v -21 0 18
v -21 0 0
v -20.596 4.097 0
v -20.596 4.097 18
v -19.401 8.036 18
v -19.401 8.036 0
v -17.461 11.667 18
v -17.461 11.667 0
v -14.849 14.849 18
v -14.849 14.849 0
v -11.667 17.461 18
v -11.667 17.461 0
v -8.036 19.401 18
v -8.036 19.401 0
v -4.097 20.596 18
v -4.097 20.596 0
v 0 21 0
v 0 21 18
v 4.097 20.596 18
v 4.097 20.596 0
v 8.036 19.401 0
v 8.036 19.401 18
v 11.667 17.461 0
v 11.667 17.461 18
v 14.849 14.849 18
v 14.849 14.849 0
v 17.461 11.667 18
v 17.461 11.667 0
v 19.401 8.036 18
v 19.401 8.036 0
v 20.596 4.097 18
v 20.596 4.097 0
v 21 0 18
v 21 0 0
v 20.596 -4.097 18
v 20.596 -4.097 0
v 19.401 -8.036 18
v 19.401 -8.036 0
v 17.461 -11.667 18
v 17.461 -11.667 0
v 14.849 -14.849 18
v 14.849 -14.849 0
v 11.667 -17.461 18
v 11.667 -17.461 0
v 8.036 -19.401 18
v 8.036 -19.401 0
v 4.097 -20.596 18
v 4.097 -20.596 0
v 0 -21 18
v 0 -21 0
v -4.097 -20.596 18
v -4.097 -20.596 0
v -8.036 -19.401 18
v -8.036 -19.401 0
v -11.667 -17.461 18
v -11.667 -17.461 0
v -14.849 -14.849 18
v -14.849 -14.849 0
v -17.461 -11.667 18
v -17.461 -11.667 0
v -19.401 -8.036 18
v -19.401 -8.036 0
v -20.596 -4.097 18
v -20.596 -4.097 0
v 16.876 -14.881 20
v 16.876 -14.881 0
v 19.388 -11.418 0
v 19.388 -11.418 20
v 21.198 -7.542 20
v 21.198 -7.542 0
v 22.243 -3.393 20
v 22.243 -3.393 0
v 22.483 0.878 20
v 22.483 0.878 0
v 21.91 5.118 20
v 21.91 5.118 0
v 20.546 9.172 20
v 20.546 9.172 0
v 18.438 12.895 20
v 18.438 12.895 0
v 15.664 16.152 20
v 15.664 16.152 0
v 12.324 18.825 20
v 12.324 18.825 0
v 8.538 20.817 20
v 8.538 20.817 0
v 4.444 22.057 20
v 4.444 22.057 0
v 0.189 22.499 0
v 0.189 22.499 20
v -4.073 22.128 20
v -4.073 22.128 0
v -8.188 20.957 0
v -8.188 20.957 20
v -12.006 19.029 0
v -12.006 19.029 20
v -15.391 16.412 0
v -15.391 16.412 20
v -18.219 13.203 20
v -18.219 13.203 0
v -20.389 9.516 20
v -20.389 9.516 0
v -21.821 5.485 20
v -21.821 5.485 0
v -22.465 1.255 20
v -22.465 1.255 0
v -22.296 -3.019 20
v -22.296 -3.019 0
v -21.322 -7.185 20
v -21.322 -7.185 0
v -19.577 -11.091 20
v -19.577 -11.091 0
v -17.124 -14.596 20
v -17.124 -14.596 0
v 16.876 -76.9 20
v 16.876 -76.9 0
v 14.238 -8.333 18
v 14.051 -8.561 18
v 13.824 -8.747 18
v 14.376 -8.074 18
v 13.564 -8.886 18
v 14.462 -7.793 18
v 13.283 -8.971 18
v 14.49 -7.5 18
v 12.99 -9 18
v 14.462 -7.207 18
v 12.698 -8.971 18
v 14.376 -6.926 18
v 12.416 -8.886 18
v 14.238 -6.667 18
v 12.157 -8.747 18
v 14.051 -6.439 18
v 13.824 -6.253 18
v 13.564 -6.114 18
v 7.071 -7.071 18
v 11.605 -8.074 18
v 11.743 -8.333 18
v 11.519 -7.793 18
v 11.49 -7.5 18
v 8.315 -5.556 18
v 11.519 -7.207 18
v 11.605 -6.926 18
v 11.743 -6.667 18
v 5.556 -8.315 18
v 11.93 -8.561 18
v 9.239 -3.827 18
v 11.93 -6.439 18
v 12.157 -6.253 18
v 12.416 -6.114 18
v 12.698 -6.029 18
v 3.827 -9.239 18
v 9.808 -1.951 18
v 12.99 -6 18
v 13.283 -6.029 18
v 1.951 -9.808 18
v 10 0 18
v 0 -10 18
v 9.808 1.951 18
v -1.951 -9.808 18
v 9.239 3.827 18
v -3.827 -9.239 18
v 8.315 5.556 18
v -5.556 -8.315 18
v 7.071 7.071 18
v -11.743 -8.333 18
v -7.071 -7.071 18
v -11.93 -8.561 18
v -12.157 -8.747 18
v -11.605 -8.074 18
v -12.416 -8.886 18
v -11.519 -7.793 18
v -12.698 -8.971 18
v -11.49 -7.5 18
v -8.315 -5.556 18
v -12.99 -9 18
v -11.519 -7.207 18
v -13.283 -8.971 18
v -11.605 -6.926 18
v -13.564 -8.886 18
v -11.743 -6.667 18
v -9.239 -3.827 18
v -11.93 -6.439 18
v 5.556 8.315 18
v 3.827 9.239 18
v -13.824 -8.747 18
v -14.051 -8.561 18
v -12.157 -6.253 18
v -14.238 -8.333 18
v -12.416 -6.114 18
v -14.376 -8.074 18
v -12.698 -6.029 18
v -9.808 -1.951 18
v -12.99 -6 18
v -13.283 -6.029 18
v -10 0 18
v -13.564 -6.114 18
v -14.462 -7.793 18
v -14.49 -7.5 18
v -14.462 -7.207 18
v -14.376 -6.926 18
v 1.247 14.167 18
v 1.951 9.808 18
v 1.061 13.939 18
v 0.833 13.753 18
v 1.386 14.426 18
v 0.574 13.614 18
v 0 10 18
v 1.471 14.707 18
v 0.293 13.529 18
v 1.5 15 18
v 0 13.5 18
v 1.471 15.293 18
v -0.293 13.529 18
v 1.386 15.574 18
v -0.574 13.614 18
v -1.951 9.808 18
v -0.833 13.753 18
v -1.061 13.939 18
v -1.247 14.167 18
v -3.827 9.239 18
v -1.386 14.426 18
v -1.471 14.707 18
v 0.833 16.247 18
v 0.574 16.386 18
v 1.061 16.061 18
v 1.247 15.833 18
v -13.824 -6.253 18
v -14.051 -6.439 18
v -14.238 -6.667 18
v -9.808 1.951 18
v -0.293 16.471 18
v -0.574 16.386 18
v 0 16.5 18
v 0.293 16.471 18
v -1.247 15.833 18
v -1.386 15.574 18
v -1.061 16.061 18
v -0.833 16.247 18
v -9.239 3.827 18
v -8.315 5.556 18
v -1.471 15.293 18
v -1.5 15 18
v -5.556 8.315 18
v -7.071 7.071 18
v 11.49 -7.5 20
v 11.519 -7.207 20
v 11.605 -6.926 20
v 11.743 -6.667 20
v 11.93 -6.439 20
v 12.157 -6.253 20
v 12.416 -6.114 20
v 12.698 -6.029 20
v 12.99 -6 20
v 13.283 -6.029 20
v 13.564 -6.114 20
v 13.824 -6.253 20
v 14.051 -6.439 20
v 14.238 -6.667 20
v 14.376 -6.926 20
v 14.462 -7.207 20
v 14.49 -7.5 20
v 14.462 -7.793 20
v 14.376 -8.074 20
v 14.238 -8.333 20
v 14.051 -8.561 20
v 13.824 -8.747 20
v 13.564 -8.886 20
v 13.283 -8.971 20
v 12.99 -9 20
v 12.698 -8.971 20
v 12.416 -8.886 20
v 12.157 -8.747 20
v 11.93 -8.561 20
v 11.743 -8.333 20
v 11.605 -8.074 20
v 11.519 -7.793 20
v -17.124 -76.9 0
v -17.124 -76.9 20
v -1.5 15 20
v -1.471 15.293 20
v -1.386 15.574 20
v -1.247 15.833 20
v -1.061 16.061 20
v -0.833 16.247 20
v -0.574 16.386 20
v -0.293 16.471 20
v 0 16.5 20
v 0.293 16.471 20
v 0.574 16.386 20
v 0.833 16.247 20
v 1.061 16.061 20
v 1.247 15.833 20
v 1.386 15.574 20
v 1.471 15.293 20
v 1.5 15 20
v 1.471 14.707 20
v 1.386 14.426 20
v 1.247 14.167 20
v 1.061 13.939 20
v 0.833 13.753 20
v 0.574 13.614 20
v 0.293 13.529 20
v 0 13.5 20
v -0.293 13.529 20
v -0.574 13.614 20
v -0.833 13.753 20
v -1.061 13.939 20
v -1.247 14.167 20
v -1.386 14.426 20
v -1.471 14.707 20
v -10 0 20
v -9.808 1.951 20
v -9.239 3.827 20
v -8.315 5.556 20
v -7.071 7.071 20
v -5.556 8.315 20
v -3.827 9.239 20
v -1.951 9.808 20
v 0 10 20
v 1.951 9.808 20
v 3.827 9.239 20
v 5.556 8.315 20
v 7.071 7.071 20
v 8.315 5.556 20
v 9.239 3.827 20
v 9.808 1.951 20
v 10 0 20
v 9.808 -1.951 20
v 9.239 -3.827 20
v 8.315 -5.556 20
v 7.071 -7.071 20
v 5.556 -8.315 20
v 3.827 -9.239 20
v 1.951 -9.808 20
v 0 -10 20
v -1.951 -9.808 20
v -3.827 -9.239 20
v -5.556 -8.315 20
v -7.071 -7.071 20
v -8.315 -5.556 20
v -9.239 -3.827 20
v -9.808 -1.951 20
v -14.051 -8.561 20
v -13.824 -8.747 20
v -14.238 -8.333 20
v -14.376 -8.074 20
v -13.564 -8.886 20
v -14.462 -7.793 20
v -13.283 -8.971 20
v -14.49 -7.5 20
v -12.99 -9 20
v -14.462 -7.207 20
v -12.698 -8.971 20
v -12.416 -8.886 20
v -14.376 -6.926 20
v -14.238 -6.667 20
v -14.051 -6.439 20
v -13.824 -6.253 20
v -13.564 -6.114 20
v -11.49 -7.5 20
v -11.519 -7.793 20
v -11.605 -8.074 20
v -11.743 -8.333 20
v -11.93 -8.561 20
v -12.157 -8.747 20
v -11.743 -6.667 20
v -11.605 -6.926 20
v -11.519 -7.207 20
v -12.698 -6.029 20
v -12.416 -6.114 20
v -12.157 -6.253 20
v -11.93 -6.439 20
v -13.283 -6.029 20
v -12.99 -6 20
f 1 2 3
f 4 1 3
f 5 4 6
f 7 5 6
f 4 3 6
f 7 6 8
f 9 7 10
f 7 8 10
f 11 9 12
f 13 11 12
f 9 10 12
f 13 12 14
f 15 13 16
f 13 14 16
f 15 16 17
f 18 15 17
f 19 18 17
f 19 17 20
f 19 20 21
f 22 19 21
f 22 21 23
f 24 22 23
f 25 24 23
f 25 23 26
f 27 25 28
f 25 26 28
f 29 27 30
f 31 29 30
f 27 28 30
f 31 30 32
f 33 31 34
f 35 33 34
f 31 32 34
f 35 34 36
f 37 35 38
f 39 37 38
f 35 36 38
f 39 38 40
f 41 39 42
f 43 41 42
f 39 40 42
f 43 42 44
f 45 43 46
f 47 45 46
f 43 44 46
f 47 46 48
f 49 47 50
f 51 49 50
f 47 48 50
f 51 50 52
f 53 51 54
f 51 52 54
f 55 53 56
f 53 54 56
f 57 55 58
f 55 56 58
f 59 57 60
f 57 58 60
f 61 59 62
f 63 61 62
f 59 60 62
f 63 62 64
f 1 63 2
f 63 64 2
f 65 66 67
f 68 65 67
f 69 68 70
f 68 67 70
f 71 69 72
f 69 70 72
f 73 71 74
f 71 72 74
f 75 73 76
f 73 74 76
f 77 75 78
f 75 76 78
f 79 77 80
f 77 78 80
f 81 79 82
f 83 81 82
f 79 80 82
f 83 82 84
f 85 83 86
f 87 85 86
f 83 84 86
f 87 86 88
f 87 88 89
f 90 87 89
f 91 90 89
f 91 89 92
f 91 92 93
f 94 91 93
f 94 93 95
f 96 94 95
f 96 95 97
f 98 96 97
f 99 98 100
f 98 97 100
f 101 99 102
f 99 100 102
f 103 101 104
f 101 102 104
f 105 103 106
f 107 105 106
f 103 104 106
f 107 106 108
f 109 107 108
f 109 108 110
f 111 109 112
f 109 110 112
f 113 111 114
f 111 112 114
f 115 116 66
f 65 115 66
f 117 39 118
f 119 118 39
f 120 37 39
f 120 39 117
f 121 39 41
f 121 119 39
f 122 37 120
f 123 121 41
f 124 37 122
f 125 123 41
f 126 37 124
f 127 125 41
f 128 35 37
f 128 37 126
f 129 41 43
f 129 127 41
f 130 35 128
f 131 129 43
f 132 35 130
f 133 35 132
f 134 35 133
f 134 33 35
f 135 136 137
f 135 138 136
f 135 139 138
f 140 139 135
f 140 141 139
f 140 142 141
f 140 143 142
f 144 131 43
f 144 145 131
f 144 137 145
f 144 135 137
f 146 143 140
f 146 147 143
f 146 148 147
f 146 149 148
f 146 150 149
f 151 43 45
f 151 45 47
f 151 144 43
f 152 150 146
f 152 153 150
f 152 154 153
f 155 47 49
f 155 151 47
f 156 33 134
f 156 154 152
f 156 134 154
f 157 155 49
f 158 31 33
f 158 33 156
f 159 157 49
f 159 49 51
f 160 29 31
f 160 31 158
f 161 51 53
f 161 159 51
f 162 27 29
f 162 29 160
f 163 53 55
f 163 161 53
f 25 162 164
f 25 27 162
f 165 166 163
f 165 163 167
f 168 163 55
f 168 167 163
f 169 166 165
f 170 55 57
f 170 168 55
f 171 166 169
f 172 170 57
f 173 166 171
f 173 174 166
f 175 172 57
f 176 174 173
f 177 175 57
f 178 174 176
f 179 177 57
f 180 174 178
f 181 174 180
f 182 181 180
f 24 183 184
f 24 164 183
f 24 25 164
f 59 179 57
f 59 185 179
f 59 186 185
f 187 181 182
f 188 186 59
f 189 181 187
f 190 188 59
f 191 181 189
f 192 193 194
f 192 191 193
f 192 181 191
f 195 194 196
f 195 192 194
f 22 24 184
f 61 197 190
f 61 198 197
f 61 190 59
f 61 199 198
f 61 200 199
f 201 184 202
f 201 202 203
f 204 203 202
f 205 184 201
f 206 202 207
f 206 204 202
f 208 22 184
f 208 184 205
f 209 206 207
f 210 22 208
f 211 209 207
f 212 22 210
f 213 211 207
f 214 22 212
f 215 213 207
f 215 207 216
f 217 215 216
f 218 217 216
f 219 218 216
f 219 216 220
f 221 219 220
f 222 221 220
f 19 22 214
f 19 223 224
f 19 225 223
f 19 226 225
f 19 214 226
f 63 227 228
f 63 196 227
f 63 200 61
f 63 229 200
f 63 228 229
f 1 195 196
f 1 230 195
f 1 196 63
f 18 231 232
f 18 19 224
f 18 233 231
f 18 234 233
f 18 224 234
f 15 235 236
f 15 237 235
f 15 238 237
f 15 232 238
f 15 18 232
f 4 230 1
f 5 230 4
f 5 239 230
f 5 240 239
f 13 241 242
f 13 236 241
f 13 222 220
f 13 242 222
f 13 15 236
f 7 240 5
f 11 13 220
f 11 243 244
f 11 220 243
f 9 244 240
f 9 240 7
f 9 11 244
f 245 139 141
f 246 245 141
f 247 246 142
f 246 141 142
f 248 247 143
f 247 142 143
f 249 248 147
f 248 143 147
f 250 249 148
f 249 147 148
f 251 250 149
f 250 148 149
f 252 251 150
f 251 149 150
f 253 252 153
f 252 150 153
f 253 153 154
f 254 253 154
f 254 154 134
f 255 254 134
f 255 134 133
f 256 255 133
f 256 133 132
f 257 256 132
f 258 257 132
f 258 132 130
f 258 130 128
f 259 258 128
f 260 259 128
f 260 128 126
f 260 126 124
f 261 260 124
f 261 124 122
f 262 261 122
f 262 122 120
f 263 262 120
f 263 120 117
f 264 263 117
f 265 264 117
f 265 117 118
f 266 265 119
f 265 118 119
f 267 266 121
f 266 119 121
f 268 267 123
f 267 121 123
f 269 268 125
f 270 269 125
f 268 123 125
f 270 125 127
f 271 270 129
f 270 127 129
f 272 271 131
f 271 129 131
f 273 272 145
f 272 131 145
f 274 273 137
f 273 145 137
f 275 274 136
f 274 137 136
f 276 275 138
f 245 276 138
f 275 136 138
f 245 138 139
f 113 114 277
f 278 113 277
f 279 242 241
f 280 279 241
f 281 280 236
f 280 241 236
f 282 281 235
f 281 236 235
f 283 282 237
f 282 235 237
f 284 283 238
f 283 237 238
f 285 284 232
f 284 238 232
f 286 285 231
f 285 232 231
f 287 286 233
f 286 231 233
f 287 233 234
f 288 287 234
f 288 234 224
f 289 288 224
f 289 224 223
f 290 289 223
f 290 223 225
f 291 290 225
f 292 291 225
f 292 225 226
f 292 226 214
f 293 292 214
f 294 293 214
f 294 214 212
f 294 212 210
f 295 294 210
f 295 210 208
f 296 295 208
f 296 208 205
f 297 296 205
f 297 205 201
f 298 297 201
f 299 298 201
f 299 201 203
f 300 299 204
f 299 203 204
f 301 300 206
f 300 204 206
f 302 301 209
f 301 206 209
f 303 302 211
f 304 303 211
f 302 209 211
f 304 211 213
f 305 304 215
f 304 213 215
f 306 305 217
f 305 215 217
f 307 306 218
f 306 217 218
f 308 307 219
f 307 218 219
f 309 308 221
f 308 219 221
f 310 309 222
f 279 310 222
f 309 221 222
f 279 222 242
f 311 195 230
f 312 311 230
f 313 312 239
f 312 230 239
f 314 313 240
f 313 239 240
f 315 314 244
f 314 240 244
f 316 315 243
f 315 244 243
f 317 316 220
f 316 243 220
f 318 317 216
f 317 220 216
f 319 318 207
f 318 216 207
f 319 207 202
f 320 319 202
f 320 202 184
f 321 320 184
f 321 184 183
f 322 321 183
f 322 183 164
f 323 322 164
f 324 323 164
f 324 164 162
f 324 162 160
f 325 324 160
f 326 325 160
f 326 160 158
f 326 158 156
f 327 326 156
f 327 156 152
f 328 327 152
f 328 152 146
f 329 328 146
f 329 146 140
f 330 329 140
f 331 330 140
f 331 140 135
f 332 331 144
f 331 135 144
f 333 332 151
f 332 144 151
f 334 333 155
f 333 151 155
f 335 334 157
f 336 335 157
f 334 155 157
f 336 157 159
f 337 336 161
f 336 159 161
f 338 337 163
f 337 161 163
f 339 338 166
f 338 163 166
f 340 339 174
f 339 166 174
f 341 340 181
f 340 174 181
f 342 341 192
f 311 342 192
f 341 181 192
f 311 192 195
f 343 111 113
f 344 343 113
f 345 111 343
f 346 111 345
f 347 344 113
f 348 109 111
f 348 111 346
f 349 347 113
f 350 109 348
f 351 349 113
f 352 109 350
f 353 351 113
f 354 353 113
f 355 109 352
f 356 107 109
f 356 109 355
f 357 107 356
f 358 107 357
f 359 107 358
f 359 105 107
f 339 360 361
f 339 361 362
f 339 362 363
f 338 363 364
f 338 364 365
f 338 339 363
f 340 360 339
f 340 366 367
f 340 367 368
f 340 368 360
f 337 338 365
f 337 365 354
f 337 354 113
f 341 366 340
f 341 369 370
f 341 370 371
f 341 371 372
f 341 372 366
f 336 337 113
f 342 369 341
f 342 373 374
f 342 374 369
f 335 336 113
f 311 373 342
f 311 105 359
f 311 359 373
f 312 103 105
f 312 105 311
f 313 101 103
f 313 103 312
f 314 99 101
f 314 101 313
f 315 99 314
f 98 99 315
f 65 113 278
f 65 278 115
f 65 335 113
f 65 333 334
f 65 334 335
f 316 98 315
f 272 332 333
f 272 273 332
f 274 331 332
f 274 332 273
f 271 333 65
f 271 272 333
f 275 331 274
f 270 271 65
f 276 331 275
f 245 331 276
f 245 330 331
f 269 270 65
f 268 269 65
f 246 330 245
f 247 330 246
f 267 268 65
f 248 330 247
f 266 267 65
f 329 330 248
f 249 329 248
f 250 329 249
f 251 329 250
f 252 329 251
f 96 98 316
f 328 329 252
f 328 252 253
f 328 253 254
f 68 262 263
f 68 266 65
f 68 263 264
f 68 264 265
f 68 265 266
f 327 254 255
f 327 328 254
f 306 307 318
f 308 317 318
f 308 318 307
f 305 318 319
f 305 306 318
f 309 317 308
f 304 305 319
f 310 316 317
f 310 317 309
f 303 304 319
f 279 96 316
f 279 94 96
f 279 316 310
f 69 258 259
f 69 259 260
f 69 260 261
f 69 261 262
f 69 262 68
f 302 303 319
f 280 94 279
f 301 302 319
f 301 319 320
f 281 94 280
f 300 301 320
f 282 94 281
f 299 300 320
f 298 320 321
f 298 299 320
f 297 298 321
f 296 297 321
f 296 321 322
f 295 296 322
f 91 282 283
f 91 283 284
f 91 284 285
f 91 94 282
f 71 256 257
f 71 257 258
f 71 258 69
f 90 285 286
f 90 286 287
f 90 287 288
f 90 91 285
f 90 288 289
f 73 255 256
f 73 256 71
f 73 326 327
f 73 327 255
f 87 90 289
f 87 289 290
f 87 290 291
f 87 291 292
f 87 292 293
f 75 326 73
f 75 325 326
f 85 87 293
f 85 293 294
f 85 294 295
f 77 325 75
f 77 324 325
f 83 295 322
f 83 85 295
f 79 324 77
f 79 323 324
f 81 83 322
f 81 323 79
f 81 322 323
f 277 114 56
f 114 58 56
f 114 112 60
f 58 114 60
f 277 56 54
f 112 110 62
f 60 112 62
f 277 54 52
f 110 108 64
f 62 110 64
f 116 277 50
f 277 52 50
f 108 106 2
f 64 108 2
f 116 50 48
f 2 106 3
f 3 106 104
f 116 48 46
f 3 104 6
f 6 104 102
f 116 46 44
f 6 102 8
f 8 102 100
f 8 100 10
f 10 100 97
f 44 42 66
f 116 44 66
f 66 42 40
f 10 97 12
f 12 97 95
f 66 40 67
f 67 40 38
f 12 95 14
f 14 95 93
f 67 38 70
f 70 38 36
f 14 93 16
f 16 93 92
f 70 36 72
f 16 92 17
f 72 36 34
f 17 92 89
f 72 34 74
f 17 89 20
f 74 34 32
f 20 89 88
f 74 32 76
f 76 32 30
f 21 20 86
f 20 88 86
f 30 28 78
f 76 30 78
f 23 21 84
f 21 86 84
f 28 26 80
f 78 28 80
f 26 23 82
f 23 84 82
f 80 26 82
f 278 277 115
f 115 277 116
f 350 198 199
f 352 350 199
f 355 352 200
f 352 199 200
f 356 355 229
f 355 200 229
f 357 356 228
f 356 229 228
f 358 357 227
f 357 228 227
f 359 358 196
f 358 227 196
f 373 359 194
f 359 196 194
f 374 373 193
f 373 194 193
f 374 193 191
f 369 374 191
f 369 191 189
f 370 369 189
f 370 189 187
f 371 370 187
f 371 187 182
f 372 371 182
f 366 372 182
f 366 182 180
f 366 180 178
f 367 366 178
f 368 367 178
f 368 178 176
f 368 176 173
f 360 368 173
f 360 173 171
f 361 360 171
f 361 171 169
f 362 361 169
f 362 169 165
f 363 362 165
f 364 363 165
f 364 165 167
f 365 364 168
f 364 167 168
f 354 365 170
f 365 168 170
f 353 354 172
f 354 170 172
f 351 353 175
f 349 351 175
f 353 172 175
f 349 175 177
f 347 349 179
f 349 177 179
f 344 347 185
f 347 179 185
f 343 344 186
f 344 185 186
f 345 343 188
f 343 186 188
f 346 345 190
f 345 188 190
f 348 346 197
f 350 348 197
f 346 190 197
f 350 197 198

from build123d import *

# Parameters (mm, degrees)
SKETCH1_R           = 22.5
BOSS_EXTRUDE1_DEPTH = 20
SKETCH2_R           = 10
CUT_EXTRUDE1_DEPTH  = 20
SKETCH3_R           = 1.5
CUT_EXTRUDE2_DEPTH  = 20
SKETCH4_R           = 21
CUT_EXTRUDE3_DEPTH  = 18


with BuildPart() as part:
    # Sketch1 → Boss-Extrude1 (new body)
    with BuildSketch(Plane.XY):
        Circle(SKETCH1_R)
        with BuildLine():
            Line((-17.123625514, -14.595596913), (-17.123625514, -76.9))
            Line((-17.123625514, -76.9), (16.876374486, -76.9))
            Line((16.876374486, -76.9), (16.876374486, -14.880792459))
            ThreePointArc((16.876374486, -14.880792459), (-0.188725707, -22.499208488), (-17.123625514, -14.595596913))
        make_face()
    extrude(amount=BOSS_EXTRUDE1_DEPTH)

    # Sketch2 → Cut-Extrude1 (cut)
    with BuildSketch(Plane(origin=(0, 0, 0), x_dir=(-1, 0, 0), z_dir=(0, 0, -1))):
        Circle(SKETCH2_R)
    extrude(amount=-CUT_EXTRUDE1_DEPTH, mode=Mode.SUBTRACT)

    # Sketch3 → Cut-Extrude2 (cut)
    with BuildSketch(Plane(origin=(0, 0, 0), x_dir=(-1, 0, 0), z_dir=(0, 0, -1))):
        with Locations((0, 15)):
            Circle(SKETCH3_R)
        with Locations((12.990381057, -7.5)):
            Circle(SKETCH3_R)
        with Locations((-12.990381057, -7.5)):
            Circle(SKETCH3_R)
    extrude(amount=-CUT_EXTRUDE2_DEPTH, mode=Mode.SUBTRACT)

    # Sketch4 → Cut-Extrude3 (cut)
    with BuildSketch(Plane(origin=(0, 0, 0), x_dir=(-1, 0, 0), z_dir=(0, 0, -1))):
        Circle(SKETCH4_R)
    extrude(amount=-CUT_EXTRUDE3_DEPTH, mode=Mode.SUBTRACT)


solid = part.part
